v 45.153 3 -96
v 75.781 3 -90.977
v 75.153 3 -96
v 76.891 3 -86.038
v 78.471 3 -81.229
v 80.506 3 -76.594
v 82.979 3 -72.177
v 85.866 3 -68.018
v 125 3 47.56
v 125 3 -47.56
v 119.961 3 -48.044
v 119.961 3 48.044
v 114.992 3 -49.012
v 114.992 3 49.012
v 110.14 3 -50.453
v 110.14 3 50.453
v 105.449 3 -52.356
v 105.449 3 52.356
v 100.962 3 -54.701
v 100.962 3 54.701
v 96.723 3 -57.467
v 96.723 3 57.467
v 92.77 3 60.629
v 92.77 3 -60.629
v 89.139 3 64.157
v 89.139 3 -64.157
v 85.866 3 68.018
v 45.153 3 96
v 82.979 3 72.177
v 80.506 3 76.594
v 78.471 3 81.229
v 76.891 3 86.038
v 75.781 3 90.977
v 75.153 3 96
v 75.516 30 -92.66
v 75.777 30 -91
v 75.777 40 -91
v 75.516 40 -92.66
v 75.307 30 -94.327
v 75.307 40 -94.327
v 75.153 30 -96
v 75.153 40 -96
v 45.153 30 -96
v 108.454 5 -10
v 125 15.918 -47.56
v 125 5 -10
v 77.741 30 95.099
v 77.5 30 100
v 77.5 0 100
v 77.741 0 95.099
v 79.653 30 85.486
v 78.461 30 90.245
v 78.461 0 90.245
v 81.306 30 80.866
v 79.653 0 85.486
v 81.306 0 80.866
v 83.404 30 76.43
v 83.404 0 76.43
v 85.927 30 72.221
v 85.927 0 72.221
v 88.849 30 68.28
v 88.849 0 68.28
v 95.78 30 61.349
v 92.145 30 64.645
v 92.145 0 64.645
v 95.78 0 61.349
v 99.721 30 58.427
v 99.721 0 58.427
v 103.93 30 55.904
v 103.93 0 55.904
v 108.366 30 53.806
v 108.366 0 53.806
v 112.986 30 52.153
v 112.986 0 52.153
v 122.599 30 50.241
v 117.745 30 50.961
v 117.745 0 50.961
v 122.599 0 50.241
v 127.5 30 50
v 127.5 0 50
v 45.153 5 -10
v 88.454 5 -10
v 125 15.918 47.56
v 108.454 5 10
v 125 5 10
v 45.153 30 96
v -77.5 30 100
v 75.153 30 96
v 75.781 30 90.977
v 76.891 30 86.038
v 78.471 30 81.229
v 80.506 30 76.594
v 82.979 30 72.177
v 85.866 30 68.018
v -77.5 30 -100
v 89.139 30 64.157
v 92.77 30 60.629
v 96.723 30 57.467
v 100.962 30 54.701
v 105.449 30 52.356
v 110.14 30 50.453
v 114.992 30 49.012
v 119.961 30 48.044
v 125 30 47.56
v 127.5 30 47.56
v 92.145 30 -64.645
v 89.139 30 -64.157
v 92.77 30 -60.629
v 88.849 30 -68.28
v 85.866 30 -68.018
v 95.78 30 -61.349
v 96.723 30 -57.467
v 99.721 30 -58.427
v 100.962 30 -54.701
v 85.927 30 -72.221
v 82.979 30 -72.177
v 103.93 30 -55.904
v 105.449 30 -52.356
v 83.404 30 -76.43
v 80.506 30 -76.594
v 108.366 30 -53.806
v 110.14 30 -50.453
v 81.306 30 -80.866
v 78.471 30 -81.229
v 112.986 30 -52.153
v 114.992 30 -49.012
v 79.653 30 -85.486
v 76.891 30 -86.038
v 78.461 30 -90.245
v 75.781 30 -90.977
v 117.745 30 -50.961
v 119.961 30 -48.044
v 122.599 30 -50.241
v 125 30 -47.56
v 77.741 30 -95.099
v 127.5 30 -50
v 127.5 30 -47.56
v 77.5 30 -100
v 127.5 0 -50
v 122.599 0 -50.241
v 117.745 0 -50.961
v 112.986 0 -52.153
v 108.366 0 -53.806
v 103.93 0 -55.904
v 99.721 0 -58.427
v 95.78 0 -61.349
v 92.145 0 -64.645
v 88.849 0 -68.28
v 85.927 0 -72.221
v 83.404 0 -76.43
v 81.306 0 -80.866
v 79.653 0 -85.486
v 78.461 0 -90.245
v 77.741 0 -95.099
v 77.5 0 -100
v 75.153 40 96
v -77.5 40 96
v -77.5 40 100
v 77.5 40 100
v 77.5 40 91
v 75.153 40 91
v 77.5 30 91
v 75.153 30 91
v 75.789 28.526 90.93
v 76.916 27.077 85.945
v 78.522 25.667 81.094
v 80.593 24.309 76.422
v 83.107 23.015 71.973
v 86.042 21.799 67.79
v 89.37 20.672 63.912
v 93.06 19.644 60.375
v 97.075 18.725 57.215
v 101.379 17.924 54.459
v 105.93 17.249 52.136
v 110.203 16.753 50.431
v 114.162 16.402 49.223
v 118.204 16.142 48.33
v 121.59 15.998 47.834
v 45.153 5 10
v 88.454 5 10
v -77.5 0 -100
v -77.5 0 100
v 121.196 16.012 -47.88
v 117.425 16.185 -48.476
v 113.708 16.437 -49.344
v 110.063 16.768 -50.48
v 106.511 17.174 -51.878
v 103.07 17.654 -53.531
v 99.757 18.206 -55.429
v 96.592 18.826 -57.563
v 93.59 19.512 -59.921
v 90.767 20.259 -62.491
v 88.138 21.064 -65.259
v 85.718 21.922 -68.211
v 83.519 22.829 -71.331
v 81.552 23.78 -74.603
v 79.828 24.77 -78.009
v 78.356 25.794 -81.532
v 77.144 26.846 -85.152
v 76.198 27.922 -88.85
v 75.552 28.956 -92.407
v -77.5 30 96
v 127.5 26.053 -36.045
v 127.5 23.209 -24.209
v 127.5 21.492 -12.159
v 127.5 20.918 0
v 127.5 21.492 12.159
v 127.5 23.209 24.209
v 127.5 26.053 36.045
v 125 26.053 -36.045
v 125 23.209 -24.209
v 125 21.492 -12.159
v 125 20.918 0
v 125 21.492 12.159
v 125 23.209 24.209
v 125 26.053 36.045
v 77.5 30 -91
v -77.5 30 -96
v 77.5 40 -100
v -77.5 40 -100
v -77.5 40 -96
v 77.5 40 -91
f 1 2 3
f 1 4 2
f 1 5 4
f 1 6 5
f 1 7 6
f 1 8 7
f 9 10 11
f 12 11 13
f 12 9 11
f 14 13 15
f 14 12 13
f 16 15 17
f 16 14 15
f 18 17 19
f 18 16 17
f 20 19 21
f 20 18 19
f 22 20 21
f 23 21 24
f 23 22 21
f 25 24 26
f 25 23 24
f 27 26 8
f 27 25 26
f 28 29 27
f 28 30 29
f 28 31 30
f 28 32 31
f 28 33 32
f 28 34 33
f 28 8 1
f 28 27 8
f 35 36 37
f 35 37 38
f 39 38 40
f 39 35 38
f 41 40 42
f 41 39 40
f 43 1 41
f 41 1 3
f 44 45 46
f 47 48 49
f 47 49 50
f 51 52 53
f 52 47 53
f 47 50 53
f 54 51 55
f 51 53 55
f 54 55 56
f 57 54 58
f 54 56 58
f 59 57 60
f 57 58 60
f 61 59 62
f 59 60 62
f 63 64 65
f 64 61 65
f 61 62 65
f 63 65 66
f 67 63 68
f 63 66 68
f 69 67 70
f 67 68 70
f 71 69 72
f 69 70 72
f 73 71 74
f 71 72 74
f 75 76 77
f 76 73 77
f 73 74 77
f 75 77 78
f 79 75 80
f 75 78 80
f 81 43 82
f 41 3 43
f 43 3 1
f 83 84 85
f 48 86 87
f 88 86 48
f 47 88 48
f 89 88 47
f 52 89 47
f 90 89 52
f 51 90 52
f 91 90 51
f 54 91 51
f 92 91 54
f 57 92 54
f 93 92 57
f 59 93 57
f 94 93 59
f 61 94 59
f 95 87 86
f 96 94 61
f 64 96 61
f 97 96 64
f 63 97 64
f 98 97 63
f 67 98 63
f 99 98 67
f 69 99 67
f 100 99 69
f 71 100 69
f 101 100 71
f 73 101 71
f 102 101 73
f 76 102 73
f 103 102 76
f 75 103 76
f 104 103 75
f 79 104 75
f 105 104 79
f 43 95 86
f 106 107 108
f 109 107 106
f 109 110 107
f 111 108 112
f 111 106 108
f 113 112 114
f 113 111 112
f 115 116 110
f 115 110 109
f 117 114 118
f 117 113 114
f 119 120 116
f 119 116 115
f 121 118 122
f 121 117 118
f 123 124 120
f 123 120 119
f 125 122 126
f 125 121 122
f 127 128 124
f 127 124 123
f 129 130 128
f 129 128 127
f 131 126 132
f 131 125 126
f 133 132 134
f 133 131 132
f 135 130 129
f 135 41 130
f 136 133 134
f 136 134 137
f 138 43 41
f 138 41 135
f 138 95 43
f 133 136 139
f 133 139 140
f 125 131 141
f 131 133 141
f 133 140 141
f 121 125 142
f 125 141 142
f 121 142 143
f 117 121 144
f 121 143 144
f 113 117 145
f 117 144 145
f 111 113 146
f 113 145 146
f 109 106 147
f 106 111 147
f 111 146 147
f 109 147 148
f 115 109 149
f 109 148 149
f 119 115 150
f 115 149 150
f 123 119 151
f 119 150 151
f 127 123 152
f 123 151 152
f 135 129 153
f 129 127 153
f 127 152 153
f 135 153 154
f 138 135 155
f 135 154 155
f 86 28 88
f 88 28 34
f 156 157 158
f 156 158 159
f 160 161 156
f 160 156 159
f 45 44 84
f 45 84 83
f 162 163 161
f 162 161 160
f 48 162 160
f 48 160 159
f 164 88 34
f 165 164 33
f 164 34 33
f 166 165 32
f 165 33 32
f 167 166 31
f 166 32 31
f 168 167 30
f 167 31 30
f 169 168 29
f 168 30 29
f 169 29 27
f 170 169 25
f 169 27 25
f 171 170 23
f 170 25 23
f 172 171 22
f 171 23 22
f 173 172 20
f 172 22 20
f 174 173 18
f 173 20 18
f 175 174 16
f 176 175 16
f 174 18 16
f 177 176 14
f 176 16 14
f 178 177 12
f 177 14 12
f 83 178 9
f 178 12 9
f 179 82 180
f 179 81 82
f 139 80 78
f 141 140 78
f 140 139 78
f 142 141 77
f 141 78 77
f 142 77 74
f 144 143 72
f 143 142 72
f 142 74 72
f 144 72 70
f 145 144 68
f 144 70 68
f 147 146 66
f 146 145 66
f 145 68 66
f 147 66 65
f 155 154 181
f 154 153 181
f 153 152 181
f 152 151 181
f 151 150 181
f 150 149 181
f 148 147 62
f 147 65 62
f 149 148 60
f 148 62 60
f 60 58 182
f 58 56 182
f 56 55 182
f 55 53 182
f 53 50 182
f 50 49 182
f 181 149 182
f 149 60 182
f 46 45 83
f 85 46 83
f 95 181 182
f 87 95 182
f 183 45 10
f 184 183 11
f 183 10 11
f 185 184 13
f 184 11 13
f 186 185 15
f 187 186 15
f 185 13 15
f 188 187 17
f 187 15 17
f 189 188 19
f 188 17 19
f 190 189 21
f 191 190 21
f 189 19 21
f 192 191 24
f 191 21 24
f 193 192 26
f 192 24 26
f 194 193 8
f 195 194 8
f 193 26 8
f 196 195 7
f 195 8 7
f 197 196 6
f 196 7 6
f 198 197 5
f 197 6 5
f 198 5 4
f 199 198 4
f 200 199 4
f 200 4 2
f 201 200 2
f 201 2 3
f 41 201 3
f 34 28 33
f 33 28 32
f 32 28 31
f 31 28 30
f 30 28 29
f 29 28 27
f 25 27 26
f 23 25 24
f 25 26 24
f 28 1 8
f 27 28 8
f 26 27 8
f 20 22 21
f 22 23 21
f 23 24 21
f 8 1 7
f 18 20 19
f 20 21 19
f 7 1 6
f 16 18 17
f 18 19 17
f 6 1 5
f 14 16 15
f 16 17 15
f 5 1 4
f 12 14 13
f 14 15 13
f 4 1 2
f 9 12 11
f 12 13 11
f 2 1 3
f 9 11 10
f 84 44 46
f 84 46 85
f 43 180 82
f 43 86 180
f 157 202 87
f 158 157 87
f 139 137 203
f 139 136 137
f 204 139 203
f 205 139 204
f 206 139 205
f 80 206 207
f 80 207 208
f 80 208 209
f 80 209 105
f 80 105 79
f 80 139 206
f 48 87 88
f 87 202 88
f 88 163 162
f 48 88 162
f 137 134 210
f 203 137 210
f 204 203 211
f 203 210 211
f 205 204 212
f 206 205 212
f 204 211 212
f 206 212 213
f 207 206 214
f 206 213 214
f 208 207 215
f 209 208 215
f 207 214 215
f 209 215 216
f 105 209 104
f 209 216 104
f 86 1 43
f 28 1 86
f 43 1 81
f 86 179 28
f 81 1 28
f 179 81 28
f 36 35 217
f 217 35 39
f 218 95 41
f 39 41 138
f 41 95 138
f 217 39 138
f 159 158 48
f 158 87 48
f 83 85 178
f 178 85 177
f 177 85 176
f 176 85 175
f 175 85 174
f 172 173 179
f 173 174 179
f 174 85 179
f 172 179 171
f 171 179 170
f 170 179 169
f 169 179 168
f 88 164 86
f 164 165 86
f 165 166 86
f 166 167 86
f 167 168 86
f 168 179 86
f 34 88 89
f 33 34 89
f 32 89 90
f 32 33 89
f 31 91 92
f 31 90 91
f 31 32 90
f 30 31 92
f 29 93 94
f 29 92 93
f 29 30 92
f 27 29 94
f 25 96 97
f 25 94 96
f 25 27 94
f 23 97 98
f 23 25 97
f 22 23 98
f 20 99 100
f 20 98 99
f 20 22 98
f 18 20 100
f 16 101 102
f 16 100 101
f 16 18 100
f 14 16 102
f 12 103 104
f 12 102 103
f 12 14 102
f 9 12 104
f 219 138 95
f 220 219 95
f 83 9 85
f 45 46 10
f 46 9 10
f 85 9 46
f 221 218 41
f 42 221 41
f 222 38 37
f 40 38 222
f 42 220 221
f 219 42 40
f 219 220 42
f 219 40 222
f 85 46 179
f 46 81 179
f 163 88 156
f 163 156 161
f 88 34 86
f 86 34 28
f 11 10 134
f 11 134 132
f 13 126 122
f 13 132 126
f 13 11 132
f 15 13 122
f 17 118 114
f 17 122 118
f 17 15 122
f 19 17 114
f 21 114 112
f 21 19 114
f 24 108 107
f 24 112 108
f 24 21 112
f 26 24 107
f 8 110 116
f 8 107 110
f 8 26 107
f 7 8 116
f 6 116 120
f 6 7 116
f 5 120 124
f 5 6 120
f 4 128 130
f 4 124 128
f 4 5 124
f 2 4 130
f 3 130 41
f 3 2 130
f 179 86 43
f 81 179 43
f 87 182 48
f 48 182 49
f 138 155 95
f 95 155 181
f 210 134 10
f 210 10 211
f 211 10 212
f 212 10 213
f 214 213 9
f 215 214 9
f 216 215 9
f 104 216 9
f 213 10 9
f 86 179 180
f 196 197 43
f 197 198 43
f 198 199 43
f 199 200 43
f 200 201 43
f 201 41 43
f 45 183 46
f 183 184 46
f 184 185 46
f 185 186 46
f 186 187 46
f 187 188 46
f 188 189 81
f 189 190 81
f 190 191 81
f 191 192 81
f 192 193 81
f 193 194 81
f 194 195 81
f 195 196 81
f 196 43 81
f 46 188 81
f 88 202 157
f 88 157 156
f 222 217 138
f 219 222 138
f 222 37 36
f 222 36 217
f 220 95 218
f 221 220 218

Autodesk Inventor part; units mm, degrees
ref_plane "YZ Plane" through (0, 0, 0) normal (1, 0, 0) x (0, 1, 0)
ref_plane "XY Plane" through (0, 0, 0) normal (0, 0, 1) x (1, 0, 0)
sketch "Эскиз1" plane through (0, 0, 0) normal (0, 1, 0) x (-1, 0, 0)
  line L0 (77.5, 100) -> (-77.5, 100)
  line L1 (-77.5, 100) -> (-77.5, 50) construction
  line L2 (-77.5, -100) -> (77.5, -100)
  line L3 (77.5, -100) -> (77.5, 100)
  line L4 (77.5, -100) -> (-77.5, 100) construction
  line L5 (-77.5, -100) -> (77.5, 100) construction
  line L6 (-77.5, -50) -> (-127.5, -50) construction
  line L7 (-127.5, -50) -> (-127.5, 0)
  line L8 (-127.5, 50) -> (-77.5, 50) construction
  line L9 (-77.5, 50) -> (-77.5, -50) construction
  line L10 (118.5, 0) -> (-168.5, 0) construction
  line L11 (-127.5, 0) -> (-127.5, 50)
  line L12 (-77.5, -50) -> (-77.5, -100) construction
  line L13 (-77.5, 50) -> (-77.5, -50) construction
  arc A0 (-77.5, -100) -> (-127.5, -50) centre (-127.5, -100) ccw
  arc A1 (-127.5, 50) -> (-77.5, 100) centre (-127.5, 100) ccw
  point P0 (0, 0)
  point P1 (0, 0)
  dimension "d0" = 200
  dimension "d1" = 155
  dimension "d2" = 50
extrude "Выдавливание1" add sketch "Эскиз1" along normal blind 3
sketch "Эскиз3" plane through (0, 3, 0) normal (0, 1, 0) x (1, 0, 0)
  arc A0 (77.5, 100) -> (127.5, 50) centre (127.5, 100) ccw projected
  line L0 (127.5, 50) -> (127.5, -50) projected
  arc A1 (127.5, -50) -> (77.5, -100) centre (127.5, -100) ccw projected
  line L1 (77.5, -100) -> (-77.5, -100) projected
  line L2 (-77.5, -100) -> (-77.5, 100) projected
  line L3 (-77.5, 100) -> (77.5, 100) projected
  arc A2 (75.1526, 96) -> (125, 47.5596) centre (127.5, 100) ccw
  line L4 (125, 47.5596) -> (125, -47.5596)
  arc A3 (125, -47.5596) -> (75.1526, -96) centre (127.5, -100) ccw
  line L5 (75.1526, -96) -> (45.1526, -96)
  line L6 (45.1526, 96) -> (75.1526, 96)
  line L7 (45.1526, 96) -> (45.1526, -96)
  dimension "d28" = 2.5
  dimension "d29" = 30
  dimension "d30" = 4
  dimension "d31" = 4
extrude "Выдавливание2" add sketch "Эскиз3" along normal blind 27
sketch "Эскиз4" plane through (0, 3, 0) normal (0, 1, 0) x (1, 0, 0)
  line L0 (125, -47.5596) -> (125, 47.5596) projected
  arc A0 (75.1526, 96) -> (125, 47.5596) centre (127.5, 100) ccw projected
  line L1 (75.1526, 96) -> (45.1526, 96) projected
  line L2 (45.1526, 96) -> (45.1526, -96) projected
  line L3 (45.1526, -96) -> (75.1526, -96) projected
  arc A1 (125, -47.5596) -> (75.1526, -96) centre (127.5, -100) ccw projected
  point P0 (0, 0)
extrude "Выдавливание3" add sketch "Эскиз4" along normal up to surface (27 mm away) separate body
sketch "Эскиз5" plane through (45.1526, 3, -96) normal (-1, 0, 0) x (0, 0, 1)
  line L0 (0, 27) -> (86, 2)
  line L1 (86, 2) -> (106, 2)
  line L2 (106, 2) -> (192, 27)
  line L3 (0, 0) -> (192, 0) construction
  line L4 (192, 27) -> (0, 27) projected
  dimension "d32" = 20
  dimension "d33" = 2
extrude "Выдавливание4" cut sketch "Эскиз5" against normal through all bodies 2
sketch "Эскиз7" plane through (0, 30, 0) normal (0, 1, 0) x (1, 0, 0)
  line L0 (127.5, -50) -> (127.5, 50) construction
  arc A0 (77.5, 100) -> (127.5, 50) centre (127.5, 100) ccw construction
  line L1 (77.5, 100) -> (-77.5, 100) construction
  line L2 (-77.5, 100) -> (-77.5, -100) construction
  line L3 (-77.5, -100) -> (77.5, -100) construction
  arc A1 (127.5, -50) -> (77.5, -100) centre (127.5, -100) ccw construction
  arc A2 (125, -47.5596) -> (75.1526, -96) centre (127.5, -100) ccw projected
  line L4 (75.1526, -96) -> (45.1526, -96) projected
  line L5 (45.1526, -96) -> (45.1526, 96) projected
  line L6 (45.1526, 96) -> (75.1526, 96) projected
  arc A3 (75.1526, 96) -> (125, 47.5596) centre (127.5, 100) ccw projected
  line L7 (125, 47.5596) -> (125, -47.5596) projected
extrude "Выдавливание5" add sketch "Эскиз7" against normal up to next separate body
sketch "Эскиз8" plane through (75, 30, 0) normal (0, 0, 1) x (1, 0, 0)
  line L0 (-29.8474, 0) -> (0.1526, 0) projected
  line L1 (-29.8474, 0) -> (13.4539, -25)
  line L2 (-29.8474, -25) -> (50, -25) construction
  line L3 (50, -14.0815) -> (50, -25) construction
  line L4 (33.4539, -25) -> (50, -14.0815)
  line L5 (13.4539, -25) -> (33.4539, -25)
  line L6 (0.1526, 0) -> (50, 0) projected
  line L7 (50, 0) -> (50, -14.0815) projected
  point P0 (-75, -30)
  dimension "d34" = 20
  dimension "d35" = 30
extrude "Выдавливание6" cut sketch "Эскиз8" along normal through all both and the other way through all bodies 3
sketch "Эскиз9" plane through (125, 3, -47.5596) normal (-1, 0, 0) x (0, 0, 1)
  line L0 (95.1191, 0) -> (95.1191, 27) construction
  line L1 (0, 27) -> (95.1191, 27) projected
  line L2 (-2.503, 27) -> (0, 27) construction
  line L3 (-2.503, -3) -> (-2.503, 27) construction
  line L4 (97.6221, -3) -> (-2.503, -3) construction
  line L5 (97.6221, 27) -> (97.6221, -3) construction
  line L6 (95.1191, 27) -> (97.6221, 27) construction
  line L7 (0, 0) -> (95.1191, 0) construction
  line L8 (0, 27) -> (0, 0) construction
  line L9 (37.5596, 2) -> (57.5596, 2) construction
  line L10 (57.5596, 2) -> (95.1191, 12.9185) construction
  line L11 (95.1191, 12.9185) -> (95.1191, 0) construction
  line L12 (95.1191, 0) -> (0, 0) construction
  line L13 (0, 0) -> (0, 12.9185) construction
  line L14 (0, 12.9185) -> (37.5596, 2) construction
  line L15 (0, 12.9185) -> (95.1191, 12.9185) construction
  line L16 (95.1191, 12.9185) -> (57.5596, 2) construction
  line L17 (57.5596, 2) -> (37.5596, 2) construction
  line L18 (37.5596, 2) -> (0, 12.9185) construction
  arc A0 (0, 27) -> (95.1191, 27) centre (47.5596, 146.9929) ccw
  point P0 (47.5596, -3)
  dimension "d38" = 5
extrude "Выдавливание7" cut sketch "Эскиз9" against normal through all bodies 1
sketch "Эскиз10" plane through (0, 30, 0) normal (0, 1, 0) x (1, 0, 0)
  line L0 (77.5, 100) -> (-77.5, 100) projected
  line L1 (-77.5, -100) -> (77.5, -100) projected
  line L2 (-77.5, 100) -> (-77.5, 96)
  line L3 (-77.5, -100) -> (77.5, -100) projected
  arc A0 (75.1526, 96) -> (125, 47.5596) centre (127.5, 100) ccw projected
  line L4 (75.1526, 96) -> (75.1526, 91)
  line L5 (75.1526, 91) -> (77.5, 91)
  arc A1 (77.5, 100) -> (127.5, 50) centre (127.5, 100) ccw projected
  line L6 (77.5, 91) -> (77.5, 100)
  line L7 (75.1526, -96) -> (75.1526, -91)
  line L8 (75.1526, -91) -> (77.5, -91)
  arc A2 (127.5, -50) -> (77.5, -100) centre (127.5, -100) ccw projected
  line L9 (77.5, -91) -> (77.5, -100)
  line L10 (45.1526, 96) -> (75.1526, 96) projected
  line L11 (75.1526, 96) -> (-77.5, 96)
  line L12 (-77.5, -96) -> (75.1526, -96)
  line L13 (-77.5, 96) -> (-77.5, -96) construction
  line L14 (-77.5, -96) -> (-77.5, -100)
  point P0 (0, 0)
  point P1 (75.7772, 91)
  dimension "d43" = 5
extrude "Выдавливание8" add sketch "Эскиз10" along normal blind 10 separate body contours L6 L5 A0 L10 L11 L2 L0 | L14 L12 L7 L8 L9 L1
properties part number "OutputMoneys"
